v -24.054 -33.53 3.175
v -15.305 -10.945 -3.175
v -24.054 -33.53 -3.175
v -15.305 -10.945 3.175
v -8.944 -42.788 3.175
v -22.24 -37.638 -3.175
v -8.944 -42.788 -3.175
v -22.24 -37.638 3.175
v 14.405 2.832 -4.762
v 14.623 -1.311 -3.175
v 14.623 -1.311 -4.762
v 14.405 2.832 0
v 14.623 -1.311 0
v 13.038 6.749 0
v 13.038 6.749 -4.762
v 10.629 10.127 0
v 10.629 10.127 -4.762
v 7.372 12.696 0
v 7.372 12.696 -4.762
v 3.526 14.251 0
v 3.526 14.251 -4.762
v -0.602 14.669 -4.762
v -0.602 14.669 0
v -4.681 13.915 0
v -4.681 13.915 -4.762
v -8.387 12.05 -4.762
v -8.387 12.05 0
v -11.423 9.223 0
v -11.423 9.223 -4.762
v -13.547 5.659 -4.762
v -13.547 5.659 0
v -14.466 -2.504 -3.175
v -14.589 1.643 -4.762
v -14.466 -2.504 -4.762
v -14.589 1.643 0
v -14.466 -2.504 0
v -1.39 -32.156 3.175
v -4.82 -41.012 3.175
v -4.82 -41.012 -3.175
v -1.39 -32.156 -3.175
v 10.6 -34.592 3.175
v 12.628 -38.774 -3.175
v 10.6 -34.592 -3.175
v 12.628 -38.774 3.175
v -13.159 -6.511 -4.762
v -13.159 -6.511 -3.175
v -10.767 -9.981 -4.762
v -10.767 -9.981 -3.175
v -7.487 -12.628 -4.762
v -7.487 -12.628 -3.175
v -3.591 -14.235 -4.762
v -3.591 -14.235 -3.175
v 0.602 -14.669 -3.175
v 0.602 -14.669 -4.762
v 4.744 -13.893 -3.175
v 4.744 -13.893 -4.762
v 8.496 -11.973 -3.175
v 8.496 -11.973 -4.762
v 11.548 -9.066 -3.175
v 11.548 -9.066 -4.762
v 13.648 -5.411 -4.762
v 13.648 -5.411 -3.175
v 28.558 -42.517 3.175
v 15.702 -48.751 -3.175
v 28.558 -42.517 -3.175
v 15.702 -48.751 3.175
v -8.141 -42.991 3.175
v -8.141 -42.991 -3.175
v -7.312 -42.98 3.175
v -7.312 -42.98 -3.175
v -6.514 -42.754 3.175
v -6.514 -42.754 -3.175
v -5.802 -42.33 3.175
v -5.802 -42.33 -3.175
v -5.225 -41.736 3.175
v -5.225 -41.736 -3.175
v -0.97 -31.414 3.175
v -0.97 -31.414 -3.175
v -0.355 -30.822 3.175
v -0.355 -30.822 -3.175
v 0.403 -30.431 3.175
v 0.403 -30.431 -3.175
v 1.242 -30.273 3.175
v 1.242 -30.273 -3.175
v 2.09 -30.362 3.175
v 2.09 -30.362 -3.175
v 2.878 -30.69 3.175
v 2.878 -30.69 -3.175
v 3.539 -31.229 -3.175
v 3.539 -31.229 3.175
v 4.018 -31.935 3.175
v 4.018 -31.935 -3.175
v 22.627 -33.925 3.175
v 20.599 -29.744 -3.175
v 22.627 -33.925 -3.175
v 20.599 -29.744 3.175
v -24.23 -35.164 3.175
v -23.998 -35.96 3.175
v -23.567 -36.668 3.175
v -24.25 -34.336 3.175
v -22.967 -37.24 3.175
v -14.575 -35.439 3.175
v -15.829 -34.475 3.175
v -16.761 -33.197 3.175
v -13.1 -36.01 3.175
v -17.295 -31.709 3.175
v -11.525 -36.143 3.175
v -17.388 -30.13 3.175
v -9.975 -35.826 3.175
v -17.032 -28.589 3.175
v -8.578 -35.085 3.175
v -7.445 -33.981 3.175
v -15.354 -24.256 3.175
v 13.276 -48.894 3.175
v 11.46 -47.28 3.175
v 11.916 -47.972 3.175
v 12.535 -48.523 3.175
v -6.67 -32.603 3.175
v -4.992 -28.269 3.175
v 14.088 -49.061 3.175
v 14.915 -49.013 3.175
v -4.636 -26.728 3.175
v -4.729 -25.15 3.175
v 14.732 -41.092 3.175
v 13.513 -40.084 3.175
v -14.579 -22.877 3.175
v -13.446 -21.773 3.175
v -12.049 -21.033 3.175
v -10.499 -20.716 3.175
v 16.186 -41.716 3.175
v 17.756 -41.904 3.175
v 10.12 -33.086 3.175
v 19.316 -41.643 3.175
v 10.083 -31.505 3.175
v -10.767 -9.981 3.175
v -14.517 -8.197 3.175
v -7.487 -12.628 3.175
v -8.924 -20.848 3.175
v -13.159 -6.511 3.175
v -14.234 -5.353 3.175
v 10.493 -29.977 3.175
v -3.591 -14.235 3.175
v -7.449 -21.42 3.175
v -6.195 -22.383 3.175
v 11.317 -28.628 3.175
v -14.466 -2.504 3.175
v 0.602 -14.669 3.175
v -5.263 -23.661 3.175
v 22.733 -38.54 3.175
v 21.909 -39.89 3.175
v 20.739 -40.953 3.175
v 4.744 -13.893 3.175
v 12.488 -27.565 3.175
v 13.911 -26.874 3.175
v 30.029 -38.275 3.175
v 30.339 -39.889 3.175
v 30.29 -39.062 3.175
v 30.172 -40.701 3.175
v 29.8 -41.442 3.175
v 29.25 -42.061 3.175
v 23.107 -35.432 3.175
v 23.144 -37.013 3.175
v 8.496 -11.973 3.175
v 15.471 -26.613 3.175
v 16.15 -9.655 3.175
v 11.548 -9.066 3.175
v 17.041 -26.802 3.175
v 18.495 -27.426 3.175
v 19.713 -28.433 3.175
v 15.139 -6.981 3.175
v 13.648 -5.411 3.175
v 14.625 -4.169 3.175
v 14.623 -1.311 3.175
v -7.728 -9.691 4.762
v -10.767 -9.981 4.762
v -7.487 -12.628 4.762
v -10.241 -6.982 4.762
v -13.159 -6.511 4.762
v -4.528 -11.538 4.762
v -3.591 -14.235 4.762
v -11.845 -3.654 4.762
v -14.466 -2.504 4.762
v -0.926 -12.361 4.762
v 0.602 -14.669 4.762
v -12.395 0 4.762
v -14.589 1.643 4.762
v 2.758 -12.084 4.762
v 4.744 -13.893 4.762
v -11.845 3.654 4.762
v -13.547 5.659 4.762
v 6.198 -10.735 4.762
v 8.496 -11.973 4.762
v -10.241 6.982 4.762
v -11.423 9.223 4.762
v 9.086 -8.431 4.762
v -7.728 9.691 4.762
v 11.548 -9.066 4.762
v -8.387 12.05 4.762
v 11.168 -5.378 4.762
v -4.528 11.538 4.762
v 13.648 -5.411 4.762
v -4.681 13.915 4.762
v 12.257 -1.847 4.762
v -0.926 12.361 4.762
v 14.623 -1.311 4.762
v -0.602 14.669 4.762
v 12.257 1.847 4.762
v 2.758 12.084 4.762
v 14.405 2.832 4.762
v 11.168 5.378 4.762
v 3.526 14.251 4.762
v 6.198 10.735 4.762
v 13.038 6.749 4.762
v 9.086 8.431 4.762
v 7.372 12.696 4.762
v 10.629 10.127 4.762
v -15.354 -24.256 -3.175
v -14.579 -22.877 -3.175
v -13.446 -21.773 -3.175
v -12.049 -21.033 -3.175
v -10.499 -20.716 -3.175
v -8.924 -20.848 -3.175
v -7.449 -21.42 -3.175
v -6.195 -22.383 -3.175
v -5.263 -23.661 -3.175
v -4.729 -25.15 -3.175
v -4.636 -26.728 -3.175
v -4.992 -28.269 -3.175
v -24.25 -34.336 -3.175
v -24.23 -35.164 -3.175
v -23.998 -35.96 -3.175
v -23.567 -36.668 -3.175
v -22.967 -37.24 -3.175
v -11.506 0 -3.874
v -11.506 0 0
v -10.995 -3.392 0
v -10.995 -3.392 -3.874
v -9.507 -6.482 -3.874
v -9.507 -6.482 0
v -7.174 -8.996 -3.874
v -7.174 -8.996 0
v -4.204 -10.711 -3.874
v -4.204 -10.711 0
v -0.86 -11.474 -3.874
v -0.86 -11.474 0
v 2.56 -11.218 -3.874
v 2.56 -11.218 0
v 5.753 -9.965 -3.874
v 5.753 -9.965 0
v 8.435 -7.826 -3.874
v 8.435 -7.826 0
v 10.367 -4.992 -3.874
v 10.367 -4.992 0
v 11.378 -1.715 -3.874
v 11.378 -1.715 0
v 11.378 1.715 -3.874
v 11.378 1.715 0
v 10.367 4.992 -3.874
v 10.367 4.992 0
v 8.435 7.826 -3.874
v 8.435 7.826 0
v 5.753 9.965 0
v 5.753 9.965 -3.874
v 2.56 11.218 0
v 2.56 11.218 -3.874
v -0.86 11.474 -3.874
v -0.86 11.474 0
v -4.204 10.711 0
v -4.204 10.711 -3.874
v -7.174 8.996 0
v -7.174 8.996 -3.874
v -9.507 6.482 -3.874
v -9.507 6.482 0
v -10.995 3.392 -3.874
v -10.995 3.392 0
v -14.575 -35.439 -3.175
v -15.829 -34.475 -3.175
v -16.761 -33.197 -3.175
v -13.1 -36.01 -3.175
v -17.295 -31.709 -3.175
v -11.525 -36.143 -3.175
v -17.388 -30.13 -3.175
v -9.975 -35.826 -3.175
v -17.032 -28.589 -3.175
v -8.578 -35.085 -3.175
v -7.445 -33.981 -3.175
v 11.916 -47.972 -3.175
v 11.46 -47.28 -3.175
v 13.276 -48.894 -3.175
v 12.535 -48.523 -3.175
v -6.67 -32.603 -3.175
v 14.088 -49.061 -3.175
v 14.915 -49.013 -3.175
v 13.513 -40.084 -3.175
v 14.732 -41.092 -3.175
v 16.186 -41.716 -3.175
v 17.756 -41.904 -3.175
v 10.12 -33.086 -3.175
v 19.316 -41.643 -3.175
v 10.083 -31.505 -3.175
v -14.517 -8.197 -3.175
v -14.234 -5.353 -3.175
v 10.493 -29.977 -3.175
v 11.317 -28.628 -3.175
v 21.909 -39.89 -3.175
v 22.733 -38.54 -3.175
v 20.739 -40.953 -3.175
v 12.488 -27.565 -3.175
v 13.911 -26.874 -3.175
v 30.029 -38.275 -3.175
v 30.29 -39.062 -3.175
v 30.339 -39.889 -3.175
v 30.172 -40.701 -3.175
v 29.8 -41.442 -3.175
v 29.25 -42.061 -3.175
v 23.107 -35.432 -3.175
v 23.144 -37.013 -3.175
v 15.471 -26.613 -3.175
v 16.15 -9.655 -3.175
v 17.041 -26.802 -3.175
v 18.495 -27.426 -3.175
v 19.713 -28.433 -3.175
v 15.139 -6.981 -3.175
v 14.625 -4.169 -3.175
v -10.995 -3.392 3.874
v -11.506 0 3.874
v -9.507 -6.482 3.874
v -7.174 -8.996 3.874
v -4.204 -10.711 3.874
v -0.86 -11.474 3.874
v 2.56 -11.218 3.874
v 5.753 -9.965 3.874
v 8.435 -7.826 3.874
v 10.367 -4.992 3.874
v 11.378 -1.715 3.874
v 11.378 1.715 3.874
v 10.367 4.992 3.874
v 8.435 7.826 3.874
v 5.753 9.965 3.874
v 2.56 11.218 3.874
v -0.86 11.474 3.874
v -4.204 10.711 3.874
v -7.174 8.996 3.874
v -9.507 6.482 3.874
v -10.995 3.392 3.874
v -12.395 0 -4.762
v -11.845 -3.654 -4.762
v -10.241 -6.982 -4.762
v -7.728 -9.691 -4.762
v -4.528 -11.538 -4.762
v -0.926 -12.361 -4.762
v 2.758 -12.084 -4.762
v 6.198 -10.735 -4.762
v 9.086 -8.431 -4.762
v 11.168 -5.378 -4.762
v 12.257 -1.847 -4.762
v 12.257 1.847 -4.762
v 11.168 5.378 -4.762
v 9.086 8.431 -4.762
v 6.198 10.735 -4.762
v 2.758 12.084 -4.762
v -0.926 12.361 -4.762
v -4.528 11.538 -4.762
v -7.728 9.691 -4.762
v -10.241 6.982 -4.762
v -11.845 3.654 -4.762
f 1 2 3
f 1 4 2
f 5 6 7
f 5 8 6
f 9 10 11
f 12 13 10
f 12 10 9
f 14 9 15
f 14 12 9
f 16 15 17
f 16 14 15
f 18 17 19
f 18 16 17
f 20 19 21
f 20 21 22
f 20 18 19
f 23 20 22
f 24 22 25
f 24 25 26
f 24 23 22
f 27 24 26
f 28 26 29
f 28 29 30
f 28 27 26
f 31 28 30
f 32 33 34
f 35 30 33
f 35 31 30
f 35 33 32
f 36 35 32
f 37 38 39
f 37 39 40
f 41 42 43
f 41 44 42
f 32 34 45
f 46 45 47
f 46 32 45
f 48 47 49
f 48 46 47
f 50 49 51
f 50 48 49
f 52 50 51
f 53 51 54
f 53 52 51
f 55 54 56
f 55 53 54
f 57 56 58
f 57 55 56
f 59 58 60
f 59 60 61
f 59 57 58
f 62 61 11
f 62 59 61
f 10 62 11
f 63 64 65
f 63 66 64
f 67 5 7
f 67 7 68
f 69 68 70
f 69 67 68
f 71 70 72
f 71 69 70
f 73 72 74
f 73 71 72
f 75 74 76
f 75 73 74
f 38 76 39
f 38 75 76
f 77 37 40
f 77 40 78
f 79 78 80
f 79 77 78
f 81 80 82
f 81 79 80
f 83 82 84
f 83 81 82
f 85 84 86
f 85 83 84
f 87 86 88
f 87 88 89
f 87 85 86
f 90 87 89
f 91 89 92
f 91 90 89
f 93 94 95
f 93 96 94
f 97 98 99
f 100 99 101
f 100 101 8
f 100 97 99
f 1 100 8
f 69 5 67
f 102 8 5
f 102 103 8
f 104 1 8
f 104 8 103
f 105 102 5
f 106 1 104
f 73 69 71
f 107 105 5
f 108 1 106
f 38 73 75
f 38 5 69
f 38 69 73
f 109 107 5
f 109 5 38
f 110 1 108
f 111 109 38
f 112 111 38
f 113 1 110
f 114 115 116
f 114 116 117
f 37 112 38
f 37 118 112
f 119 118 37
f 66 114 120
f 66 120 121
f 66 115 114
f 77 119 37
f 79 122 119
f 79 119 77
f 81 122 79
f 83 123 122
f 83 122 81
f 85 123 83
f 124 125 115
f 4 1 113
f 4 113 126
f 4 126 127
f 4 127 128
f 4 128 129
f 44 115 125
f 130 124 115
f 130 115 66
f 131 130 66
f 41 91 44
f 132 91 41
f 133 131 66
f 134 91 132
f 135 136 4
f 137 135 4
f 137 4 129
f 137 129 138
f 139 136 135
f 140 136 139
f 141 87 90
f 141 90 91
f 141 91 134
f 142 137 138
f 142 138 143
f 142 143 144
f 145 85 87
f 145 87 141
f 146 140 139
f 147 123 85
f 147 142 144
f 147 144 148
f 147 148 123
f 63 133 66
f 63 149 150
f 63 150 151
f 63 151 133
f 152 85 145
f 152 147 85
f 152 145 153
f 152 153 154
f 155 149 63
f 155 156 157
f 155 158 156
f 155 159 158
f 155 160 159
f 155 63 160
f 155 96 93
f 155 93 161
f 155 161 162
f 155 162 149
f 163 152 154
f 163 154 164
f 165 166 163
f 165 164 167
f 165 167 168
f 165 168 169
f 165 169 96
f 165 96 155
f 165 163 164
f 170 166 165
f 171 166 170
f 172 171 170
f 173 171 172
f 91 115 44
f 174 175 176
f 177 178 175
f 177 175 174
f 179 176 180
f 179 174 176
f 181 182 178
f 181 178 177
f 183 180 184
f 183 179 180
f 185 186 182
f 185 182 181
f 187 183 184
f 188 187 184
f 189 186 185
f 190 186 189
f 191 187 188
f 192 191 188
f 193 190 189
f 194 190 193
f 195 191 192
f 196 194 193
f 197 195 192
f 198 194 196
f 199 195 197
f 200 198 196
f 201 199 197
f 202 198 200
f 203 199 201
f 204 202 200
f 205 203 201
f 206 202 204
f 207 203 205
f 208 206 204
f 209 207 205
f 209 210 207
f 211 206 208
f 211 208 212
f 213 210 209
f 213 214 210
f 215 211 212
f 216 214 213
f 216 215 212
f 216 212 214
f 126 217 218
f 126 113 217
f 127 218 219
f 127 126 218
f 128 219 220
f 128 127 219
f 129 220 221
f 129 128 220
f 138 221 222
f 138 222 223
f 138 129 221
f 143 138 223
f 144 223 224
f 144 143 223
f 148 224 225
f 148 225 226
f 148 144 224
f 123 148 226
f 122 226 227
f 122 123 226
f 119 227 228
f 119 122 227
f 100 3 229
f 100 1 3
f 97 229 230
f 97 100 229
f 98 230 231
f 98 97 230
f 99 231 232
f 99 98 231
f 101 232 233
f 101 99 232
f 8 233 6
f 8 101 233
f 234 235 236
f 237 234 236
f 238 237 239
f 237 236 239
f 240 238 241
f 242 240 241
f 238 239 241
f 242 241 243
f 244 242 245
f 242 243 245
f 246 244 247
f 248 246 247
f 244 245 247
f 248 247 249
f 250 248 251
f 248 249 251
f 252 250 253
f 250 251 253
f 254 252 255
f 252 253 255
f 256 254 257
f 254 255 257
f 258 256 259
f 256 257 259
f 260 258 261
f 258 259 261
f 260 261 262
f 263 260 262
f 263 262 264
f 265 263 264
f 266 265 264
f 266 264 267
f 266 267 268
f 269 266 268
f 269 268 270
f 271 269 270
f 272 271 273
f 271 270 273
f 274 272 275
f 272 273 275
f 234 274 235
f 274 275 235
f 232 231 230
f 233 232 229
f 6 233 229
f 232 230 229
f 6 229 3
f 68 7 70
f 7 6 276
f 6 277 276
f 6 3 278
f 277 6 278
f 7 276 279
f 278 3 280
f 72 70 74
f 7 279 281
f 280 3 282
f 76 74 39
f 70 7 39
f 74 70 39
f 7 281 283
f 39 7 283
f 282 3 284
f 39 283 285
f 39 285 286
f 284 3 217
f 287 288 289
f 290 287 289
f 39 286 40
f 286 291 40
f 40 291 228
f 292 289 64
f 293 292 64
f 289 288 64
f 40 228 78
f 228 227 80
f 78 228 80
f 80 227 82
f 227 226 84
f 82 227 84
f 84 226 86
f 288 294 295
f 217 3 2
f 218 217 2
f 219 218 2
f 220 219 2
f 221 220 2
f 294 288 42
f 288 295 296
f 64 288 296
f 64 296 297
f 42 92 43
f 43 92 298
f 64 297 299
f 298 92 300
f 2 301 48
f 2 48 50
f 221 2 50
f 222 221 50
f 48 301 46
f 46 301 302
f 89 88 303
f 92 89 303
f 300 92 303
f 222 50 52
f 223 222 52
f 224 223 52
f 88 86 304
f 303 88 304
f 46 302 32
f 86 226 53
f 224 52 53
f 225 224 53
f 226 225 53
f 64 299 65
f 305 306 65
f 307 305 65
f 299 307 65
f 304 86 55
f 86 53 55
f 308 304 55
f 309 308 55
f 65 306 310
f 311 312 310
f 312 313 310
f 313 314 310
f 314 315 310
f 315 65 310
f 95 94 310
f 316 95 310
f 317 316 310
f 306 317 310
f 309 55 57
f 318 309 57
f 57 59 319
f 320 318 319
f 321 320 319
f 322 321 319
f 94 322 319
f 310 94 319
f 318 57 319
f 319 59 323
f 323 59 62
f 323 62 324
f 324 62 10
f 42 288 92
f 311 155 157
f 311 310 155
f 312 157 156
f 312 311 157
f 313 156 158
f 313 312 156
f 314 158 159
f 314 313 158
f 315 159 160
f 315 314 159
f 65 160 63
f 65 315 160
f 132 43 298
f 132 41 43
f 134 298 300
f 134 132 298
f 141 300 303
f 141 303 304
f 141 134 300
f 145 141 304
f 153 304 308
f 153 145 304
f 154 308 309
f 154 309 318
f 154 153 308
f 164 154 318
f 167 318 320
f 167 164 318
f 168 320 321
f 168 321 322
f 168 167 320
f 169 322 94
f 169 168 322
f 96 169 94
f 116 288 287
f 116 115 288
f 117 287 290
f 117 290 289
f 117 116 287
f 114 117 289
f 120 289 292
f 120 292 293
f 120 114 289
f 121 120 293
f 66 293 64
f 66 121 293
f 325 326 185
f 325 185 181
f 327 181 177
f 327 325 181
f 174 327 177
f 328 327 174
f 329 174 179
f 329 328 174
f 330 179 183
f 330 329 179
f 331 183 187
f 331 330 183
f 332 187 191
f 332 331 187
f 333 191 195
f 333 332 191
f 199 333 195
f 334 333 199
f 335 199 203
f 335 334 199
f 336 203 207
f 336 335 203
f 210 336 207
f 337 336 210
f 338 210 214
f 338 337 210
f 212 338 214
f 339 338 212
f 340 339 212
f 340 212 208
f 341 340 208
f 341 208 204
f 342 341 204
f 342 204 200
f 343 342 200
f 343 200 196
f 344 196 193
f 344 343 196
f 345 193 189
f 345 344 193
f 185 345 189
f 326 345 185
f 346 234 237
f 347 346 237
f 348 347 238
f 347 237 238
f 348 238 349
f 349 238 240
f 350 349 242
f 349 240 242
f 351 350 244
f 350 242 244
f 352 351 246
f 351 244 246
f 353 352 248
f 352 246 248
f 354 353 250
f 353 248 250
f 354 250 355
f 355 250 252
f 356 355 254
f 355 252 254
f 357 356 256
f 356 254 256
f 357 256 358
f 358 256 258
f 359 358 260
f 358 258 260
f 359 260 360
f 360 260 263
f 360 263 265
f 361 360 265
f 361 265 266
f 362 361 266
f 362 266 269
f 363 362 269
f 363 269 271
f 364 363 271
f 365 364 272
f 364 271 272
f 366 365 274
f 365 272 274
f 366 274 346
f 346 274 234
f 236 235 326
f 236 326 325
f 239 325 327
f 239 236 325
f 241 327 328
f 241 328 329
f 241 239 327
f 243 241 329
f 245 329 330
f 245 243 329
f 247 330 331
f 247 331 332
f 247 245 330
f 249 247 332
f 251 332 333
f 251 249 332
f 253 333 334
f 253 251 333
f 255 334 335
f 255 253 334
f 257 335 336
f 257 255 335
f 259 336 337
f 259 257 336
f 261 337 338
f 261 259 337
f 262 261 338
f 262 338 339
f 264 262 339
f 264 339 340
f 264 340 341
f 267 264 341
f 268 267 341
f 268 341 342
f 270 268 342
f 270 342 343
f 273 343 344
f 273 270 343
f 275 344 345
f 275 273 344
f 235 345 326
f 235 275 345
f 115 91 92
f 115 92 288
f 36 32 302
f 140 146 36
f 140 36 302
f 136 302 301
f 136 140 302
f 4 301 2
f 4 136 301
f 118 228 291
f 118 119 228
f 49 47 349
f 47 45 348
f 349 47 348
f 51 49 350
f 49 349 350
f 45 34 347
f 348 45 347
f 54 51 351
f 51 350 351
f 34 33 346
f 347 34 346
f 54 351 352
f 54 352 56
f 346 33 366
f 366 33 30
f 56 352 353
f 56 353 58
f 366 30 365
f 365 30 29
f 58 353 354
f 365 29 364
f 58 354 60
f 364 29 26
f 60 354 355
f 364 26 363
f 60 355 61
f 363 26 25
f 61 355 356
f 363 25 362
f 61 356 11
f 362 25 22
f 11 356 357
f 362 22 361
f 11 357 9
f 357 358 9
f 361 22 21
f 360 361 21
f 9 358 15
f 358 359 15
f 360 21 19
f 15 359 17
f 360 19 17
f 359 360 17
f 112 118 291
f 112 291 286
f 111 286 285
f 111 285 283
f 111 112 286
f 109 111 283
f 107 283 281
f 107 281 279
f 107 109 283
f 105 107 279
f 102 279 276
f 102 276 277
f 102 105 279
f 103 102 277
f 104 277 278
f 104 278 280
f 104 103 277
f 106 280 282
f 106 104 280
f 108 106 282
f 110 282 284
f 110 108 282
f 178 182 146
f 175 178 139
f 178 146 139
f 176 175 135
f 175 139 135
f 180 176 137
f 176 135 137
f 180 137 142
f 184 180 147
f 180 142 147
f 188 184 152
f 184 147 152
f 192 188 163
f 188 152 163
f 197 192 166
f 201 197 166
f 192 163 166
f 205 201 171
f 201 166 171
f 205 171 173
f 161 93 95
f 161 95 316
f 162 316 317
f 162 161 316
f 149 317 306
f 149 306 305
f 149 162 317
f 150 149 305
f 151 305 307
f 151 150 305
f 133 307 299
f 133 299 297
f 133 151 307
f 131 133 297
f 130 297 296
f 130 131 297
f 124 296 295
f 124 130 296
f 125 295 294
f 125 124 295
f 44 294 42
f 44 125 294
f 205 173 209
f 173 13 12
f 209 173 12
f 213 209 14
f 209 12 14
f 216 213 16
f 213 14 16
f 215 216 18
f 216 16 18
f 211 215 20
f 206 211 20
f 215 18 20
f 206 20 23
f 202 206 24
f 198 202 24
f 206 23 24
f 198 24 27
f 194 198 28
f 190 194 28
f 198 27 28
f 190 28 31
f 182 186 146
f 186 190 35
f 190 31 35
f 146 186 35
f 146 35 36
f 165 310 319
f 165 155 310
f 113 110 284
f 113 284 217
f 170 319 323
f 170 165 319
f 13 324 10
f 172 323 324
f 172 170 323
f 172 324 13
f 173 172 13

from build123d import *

# Parameters (mm, degrees)
SKETCH1_R           = 11.5062
BOSS_EXTRUDE2_DEPTH = 4.7625
BOSS_EXTRUDE3_DEPTH = 3.175
FILLET1_R           = 3.175
CHAMFER1_SIZE       = 0.889


with BuildPart() as part:
    # Sketch1 → Boss-Extrude2 (new, symmetric)
    with BuildSketch(Plane.XY):
        with BuildLine():
            ThreePointArc((14.622568956, -1.310767167), (-0.601565421, 14.668870184), (-14.466139546, -2.503685297))
            ThreePointArc((-14.466139546, -2.503685297), (0.601565421, -14.668870184), (14.622568956, -1.310767167))
        make_face()
        Circle(SKETCH1_R, mode=Mode.SUBTRACT)
    extrude(amount=BOSS_EXTRUDE2_DEPTH, both=True)

    # Sketch1<4> → Boss-Extrude3 (add, symmetric)
    with BuildSketch(Plane.XY):
        with BuildLine():
            ThreePointArc((-14.466139546, -2.503685297), (-14.311462857, -6.781419913), (-15.305325324, -10.94497317))
            Line((-15.305325324, -10.94497317), (-25.200549915, -36.491056527))
            Line((-25.200549915, -36.491056527), (-8.944132177, -42.787947613))
            ThreePointArc((-8.944132177, -42.787947613), (-6.514327997, -42.754109018), (-4.820124483, -41.012050504))
            Line((-4.820124483, -41.012050504), (-1.389891456, -32.156362789))
            ThreePointArc((-1.389891456, -32.156362789), (1.241500044, -30.27335404), (4.018239298, -31.93457717))
            Line((4.018239298, -31.93457717), (11.459775477, -47.279913889))
            ThreePointArc((11.459775477, -47.279913889), (13.276123878, -48.894216183), (15.701960247, -48.75134801))
            Line((15.701960247, -48.75134801), (31.414412198, -41.131783721))
            Line((31.414412198, -41.131783721), (16.150123108, -9.654995833))
            ThreePointArc((16.150123108, -9.654995833), (14.818679492, -5.586802595), (14.622568956, -1.310767167))
            ThreePointArc((14.622568956, -1.310767167), (0.601565421, -14.668870184), (-14.466139546, -2.503685297))
        make_face()
        with BuildLine():
            ThreePointArc((-6.67017355, -32.602949236), (-13.858222202, -35.777186892), (-17.032459858, -28.58913824))
            Line((-17.032459858, -28.58913824), (-15.353855363, -24.25555592))
            ThreePointArc((-15.353855363, -24.25555592), (-8.165806711, -21.081318264), (-4.991569055, -28.269366916))
            Line((-4.991569055, -28.269366916), (-6.67017355, -32.602949236))
        make_face(mode=Mode.SUBTRACT)
        with BuildLine():
            ThreePointArc((22.626728223, -33.925216011), (20.051718512, -41.34903936), (12.627895164, -38.774029649))
            Line((12.627895164, -38.774029649), (10.600086587, -34.59244608))
            ThreePointArc((10.600086587, -34.59244608), (13.175096297, -27.168622731), (20.598919646, -29.743632442))
            Line((20.598919646, -29.743632442), (22.626728223, -33.925216011))
        make_face(mode=Mode.SUBTRACT)
    extrude(amount=BOSS_EXTRUDE3_DEPTH, both=True)

    # Fillet1
    fillet1_edges = [part.edges().sort_by_distance(p)[0] for p in [
        (-25.200549915, -36.491056527, 0),
        (31.414412198, -41.131783721, 0),
    ]]
    fillet(fillet1_edges, radius=FILLET1_R)

    # Chamfer1
    chamfer1_edges = [part.edges().sort_by_distance(p)[0] for p in [
        (-11.5062, 0, -4.7625),
        (-11.5062, 0, 4.7625),
    ]]
    chamfer(chamfer1_edges, length=CHAMFER1_SIZE)


solid = part.part
